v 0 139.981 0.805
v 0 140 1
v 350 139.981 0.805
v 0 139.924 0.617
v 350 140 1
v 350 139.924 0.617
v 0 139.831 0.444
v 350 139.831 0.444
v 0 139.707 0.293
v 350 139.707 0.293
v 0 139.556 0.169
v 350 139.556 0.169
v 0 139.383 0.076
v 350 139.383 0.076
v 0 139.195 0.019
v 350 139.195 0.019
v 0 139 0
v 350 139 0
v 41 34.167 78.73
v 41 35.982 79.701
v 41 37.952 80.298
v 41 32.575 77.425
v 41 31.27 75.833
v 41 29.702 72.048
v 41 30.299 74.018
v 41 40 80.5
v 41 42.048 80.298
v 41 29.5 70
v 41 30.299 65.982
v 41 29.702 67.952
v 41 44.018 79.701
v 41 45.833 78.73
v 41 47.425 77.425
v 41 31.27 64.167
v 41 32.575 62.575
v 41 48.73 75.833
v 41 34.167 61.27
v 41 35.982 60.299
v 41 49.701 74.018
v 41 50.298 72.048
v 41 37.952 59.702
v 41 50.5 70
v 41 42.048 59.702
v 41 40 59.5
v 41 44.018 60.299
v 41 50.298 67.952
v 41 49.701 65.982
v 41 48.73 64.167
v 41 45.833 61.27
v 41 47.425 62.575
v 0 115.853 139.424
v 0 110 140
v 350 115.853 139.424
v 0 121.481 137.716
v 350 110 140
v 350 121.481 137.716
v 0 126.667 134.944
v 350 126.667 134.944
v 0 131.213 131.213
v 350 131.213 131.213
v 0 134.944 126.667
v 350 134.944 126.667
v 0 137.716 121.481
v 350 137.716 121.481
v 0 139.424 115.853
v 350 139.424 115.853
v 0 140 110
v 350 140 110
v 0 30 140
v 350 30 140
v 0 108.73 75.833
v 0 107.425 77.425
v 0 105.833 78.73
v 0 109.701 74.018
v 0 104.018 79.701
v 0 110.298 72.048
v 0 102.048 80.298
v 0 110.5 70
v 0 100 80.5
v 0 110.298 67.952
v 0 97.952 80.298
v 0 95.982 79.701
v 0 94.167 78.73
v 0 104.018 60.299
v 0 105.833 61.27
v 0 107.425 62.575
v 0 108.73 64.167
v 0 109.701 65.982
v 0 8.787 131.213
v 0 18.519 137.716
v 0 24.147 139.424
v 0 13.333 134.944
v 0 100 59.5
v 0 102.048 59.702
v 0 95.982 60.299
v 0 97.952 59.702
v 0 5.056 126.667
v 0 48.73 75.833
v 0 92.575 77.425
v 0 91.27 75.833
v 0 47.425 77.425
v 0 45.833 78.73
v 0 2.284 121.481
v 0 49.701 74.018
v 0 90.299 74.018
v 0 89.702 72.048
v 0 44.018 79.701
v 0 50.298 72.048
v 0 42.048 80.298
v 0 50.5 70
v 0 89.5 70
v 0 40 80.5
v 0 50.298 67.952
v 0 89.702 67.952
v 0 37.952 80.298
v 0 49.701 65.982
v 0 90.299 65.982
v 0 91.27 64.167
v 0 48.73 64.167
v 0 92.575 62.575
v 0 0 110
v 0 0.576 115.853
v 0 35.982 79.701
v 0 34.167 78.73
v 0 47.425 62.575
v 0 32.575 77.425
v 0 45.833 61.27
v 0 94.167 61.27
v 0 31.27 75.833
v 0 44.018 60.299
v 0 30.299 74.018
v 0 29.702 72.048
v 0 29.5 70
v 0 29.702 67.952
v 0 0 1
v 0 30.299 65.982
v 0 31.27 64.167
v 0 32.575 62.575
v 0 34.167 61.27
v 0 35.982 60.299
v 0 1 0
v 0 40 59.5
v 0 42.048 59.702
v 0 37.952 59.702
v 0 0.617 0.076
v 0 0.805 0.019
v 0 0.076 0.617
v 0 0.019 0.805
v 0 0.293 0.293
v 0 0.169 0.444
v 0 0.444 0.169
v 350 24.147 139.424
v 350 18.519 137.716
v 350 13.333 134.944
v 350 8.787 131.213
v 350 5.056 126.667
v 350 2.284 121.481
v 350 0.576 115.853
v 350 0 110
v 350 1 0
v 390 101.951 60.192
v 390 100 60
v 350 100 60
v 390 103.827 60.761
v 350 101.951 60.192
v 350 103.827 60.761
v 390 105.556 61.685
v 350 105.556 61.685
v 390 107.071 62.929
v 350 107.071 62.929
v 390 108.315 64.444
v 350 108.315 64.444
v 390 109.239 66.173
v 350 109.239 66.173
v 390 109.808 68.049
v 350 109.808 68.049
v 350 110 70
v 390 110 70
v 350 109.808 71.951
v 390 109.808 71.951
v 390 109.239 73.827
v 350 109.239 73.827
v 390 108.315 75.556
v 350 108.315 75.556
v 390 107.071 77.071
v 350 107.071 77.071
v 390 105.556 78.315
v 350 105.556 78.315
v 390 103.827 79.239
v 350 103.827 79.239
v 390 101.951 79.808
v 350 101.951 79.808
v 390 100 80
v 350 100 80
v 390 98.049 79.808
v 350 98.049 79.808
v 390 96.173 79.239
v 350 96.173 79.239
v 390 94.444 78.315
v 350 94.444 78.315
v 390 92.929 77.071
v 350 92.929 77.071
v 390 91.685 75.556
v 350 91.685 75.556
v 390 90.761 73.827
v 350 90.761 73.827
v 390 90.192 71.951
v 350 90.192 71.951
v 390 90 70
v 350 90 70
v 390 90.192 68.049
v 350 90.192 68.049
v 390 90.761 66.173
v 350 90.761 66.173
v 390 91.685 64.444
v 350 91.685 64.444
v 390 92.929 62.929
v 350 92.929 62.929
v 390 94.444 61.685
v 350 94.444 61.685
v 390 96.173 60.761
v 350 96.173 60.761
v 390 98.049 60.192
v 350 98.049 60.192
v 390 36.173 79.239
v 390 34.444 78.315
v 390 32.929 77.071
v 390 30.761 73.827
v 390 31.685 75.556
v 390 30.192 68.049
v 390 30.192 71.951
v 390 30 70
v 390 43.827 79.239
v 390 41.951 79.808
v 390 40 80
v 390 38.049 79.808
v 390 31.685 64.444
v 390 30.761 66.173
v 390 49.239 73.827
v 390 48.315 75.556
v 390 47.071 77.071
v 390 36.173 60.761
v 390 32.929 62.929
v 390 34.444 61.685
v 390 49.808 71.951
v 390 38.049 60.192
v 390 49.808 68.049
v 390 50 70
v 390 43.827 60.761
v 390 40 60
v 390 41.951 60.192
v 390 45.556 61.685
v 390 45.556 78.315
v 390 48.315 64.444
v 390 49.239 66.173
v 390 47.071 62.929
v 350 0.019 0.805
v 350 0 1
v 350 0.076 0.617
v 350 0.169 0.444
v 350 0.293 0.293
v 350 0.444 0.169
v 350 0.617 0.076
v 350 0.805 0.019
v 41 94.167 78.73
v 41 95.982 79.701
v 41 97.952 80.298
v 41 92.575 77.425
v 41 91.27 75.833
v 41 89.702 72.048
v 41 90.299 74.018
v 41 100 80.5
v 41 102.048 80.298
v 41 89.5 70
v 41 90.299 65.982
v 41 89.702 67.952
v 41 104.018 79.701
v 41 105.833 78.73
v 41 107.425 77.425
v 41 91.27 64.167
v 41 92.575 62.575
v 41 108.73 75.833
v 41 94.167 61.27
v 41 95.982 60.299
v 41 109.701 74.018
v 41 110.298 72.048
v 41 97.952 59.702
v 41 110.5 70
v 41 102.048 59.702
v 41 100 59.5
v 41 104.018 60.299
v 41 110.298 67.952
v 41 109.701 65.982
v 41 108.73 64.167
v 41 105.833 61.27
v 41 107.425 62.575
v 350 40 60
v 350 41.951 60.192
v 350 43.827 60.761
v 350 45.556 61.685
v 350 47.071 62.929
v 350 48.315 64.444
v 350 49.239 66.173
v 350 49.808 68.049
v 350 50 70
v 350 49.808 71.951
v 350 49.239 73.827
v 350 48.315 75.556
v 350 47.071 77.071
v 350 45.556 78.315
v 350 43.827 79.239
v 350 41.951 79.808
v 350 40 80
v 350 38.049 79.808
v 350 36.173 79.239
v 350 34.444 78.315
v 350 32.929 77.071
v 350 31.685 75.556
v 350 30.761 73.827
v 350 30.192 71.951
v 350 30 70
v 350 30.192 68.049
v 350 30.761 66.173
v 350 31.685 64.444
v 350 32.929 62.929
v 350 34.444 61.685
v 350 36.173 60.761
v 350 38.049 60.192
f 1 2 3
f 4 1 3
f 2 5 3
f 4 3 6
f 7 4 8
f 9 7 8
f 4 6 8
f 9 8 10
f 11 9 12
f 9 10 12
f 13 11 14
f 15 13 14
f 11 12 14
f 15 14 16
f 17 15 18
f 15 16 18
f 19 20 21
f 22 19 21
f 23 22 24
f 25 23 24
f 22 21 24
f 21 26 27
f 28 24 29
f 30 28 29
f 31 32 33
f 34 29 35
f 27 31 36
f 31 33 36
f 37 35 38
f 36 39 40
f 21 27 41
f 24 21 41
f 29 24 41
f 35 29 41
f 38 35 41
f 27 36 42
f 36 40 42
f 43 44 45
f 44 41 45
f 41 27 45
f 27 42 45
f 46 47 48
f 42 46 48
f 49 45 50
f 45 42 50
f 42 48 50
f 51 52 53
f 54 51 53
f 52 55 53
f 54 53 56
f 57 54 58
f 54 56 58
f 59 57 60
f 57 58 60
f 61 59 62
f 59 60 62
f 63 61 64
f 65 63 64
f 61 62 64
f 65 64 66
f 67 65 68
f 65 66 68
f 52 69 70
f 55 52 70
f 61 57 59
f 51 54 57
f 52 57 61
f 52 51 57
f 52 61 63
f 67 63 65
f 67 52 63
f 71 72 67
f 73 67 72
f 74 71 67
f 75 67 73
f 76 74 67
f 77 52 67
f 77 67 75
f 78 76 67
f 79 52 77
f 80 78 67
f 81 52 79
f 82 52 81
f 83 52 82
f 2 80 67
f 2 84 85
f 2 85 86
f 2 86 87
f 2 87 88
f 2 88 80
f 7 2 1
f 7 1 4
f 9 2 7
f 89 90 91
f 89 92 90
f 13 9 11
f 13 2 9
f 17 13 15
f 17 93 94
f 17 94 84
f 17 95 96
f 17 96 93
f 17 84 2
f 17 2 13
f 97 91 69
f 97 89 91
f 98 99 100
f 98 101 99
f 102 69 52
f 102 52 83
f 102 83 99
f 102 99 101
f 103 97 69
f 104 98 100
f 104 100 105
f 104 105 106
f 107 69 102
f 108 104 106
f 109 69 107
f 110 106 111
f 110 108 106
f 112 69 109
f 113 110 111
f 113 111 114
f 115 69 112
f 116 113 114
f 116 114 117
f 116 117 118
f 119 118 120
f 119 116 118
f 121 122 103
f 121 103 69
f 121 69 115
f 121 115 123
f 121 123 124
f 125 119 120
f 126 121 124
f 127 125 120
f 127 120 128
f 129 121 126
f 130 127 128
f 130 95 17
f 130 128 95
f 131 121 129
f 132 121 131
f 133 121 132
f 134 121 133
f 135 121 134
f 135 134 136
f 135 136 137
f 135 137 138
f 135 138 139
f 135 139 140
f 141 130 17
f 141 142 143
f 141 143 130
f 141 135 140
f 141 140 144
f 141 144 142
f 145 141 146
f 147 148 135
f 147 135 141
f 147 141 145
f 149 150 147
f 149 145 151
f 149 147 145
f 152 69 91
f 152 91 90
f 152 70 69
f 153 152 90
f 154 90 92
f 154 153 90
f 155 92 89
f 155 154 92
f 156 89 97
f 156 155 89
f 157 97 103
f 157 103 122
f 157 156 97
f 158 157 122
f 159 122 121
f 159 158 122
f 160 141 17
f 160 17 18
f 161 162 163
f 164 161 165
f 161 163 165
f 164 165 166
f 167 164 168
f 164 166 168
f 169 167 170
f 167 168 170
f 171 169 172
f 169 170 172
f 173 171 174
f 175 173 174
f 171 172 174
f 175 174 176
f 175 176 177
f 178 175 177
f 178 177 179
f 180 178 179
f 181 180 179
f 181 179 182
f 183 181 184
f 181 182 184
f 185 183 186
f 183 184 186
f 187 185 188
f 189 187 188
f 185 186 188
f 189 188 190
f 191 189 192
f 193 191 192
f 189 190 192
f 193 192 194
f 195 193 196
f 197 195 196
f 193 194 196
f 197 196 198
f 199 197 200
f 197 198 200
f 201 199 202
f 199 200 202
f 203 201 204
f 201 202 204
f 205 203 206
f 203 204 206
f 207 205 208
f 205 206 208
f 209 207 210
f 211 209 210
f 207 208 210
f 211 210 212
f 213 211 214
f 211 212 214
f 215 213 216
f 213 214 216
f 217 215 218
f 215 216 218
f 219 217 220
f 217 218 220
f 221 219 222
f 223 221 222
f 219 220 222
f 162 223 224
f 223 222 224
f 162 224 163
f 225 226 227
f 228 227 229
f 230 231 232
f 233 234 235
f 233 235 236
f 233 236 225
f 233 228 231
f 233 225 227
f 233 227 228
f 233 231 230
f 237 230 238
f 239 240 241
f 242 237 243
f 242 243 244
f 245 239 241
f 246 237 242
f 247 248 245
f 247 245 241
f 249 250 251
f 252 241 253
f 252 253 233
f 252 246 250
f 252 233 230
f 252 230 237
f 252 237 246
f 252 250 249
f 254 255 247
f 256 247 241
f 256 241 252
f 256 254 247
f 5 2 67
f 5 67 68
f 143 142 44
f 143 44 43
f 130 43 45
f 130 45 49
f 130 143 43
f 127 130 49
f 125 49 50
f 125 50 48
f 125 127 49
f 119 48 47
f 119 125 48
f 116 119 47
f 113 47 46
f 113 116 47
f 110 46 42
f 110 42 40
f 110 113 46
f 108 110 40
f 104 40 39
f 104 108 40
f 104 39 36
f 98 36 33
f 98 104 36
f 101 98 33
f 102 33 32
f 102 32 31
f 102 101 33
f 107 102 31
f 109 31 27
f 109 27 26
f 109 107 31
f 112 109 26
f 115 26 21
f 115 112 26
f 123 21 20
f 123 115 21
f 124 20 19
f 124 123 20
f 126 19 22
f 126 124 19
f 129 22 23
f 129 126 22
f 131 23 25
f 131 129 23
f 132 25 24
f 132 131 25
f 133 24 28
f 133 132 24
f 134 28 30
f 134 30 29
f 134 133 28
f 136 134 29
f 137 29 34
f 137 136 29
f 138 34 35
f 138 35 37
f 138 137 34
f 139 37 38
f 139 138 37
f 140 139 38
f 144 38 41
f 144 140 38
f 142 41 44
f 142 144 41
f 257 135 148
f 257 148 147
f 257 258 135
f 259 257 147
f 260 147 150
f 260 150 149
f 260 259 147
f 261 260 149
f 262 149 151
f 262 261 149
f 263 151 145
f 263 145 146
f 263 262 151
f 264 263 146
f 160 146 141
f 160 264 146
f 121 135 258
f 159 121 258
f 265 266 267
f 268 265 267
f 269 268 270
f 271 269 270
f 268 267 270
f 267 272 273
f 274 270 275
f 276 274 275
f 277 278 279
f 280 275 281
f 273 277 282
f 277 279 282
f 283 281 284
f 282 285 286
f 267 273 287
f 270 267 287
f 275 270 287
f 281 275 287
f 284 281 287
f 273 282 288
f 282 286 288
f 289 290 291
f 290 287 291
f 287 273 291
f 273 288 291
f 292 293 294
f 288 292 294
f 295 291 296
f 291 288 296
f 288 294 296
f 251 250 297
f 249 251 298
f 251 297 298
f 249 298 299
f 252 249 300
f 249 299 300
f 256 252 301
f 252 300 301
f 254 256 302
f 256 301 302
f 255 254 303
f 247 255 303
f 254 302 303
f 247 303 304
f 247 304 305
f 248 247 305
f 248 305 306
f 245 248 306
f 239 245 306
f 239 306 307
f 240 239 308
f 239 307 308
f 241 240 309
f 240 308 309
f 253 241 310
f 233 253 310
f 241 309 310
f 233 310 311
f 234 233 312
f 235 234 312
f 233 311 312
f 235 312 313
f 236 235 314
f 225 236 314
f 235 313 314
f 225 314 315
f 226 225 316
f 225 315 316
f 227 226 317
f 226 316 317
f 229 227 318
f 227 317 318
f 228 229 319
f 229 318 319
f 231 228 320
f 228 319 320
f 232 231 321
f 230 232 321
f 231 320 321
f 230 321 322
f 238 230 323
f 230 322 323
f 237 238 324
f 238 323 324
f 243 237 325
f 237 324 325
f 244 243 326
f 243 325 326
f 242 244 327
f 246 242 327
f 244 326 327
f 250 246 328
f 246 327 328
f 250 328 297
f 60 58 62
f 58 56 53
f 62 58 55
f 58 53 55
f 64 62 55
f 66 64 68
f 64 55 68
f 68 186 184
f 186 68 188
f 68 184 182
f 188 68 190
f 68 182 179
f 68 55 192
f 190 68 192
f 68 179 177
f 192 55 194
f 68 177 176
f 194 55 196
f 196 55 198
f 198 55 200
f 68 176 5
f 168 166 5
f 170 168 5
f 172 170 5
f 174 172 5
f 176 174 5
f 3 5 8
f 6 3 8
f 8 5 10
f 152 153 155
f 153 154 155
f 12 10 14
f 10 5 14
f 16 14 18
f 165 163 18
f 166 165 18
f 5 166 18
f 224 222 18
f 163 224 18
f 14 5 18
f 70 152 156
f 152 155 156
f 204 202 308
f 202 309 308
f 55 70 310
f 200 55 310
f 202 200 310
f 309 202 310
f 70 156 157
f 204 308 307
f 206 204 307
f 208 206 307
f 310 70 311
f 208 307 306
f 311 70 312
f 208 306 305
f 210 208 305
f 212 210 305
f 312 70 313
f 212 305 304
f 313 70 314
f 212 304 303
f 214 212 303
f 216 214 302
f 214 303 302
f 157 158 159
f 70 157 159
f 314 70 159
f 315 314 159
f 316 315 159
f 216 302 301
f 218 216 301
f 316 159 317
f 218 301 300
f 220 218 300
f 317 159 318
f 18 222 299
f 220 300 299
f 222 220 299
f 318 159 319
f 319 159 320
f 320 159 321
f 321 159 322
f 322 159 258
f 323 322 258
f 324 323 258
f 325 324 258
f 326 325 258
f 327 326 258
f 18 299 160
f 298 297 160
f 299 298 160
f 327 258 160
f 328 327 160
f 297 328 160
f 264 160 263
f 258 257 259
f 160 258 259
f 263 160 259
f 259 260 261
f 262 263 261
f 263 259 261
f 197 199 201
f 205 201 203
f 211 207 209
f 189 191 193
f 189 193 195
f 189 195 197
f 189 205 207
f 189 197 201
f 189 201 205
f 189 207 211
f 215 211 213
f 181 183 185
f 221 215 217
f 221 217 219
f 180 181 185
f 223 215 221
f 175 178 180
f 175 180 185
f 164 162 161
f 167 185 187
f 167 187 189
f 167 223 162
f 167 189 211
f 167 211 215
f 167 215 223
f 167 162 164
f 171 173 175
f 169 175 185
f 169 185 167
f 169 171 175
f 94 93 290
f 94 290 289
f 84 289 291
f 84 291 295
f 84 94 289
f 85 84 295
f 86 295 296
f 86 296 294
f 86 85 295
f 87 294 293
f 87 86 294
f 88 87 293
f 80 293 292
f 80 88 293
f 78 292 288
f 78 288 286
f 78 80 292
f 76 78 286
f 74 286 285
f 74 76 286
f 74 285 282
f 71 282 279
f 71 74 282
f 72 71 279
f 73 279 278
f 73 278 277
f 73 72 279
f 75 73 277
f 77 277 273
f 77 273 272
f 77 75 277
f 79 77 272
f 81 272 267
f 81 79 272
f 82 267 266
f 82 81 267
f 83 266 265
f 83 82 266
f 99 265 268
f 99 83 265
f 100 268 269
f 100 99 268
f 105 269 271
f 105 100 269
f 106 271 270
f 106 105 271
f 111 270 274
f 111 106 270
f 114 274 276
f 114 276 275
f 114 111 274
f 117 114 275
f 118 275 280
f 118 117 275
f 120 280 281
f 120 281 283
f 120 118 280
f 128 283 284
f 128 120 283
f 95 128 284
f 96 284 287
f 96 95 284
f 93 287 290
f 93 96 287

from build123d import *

# Parameters (mm, degrees)
SKETCH1_W           = 350
SKETCH1_H           = 140
BOSS_EXTRUDE1_DEPTH = 140
SKETCH2_R           = 10.5
CUT_EXTRUDE3_DEPTH  = 41
FILLET2_R           = 30
FILLET3_R           = 1
SKETCH3_R           = 10
BOSS_EXTRUDE3_DEPTH = 40


with BuildPart() as part:
    # Sketch1 → Boss-Extrude1 (new body)
    with BuildSketch(Plane(origin=(0, 0, 0), x_dir=(1, 0, 0), z_dir=(0, 1, 0))):
        with Locations((175, -70)):
            Rectangle(SKETCH1_W, SKETCH1_H)
    extrude(amount=BOSS_EXTRUDE1_DEPTH)

    # Sketch2 → Cut-Extrude3 (cut)
    with BuildSketch(Plane(origin=(0, 0, 0), x_dir=(0, 0, -1), z_dir=(1, 0, 0))):
        with Locations((-70, 100)):
            Circle(SKETCH2_R)
        with Locations((-70, 40)):
            Circle(SKETCH2_R)
    extrude(amount=CUT_EXTRUDE3_DEPTH, mode=Mode.SUBTRACT)

    # Fillet2
    fillet2_edges = [part.edges().sort_by_distance(p)[0] for p in [
        (175, 140, 140),
        (175, 0, 140),
    ]]
    fillet(fillet2_edges, radius=FILLET2_R)

    # Fillet3
    fillet3_edges = [part.edges().sort_by_distance(p)[0] for p in [
        (175, 140, 0),
        (175, 0, 0),
    ]]
    fillet(fillet3_edges, radius=FILLET3_R)

    # Sketch3 → Boss-Extrude3 (add)
    with BuildSketch(Plane(origin=(350, 0, 0), x_dir=(0, 0, -1), z_dir=(1, 0, 0))):
        with Locations((-70, 100)):
            Circle(SKETCH3_R)
        with Locations((-70, 40)):
            Circle(SKETCH3_R)
    extrude(amount=BOSS_EXTRUDE3_DEPTH)


solid = part.part
